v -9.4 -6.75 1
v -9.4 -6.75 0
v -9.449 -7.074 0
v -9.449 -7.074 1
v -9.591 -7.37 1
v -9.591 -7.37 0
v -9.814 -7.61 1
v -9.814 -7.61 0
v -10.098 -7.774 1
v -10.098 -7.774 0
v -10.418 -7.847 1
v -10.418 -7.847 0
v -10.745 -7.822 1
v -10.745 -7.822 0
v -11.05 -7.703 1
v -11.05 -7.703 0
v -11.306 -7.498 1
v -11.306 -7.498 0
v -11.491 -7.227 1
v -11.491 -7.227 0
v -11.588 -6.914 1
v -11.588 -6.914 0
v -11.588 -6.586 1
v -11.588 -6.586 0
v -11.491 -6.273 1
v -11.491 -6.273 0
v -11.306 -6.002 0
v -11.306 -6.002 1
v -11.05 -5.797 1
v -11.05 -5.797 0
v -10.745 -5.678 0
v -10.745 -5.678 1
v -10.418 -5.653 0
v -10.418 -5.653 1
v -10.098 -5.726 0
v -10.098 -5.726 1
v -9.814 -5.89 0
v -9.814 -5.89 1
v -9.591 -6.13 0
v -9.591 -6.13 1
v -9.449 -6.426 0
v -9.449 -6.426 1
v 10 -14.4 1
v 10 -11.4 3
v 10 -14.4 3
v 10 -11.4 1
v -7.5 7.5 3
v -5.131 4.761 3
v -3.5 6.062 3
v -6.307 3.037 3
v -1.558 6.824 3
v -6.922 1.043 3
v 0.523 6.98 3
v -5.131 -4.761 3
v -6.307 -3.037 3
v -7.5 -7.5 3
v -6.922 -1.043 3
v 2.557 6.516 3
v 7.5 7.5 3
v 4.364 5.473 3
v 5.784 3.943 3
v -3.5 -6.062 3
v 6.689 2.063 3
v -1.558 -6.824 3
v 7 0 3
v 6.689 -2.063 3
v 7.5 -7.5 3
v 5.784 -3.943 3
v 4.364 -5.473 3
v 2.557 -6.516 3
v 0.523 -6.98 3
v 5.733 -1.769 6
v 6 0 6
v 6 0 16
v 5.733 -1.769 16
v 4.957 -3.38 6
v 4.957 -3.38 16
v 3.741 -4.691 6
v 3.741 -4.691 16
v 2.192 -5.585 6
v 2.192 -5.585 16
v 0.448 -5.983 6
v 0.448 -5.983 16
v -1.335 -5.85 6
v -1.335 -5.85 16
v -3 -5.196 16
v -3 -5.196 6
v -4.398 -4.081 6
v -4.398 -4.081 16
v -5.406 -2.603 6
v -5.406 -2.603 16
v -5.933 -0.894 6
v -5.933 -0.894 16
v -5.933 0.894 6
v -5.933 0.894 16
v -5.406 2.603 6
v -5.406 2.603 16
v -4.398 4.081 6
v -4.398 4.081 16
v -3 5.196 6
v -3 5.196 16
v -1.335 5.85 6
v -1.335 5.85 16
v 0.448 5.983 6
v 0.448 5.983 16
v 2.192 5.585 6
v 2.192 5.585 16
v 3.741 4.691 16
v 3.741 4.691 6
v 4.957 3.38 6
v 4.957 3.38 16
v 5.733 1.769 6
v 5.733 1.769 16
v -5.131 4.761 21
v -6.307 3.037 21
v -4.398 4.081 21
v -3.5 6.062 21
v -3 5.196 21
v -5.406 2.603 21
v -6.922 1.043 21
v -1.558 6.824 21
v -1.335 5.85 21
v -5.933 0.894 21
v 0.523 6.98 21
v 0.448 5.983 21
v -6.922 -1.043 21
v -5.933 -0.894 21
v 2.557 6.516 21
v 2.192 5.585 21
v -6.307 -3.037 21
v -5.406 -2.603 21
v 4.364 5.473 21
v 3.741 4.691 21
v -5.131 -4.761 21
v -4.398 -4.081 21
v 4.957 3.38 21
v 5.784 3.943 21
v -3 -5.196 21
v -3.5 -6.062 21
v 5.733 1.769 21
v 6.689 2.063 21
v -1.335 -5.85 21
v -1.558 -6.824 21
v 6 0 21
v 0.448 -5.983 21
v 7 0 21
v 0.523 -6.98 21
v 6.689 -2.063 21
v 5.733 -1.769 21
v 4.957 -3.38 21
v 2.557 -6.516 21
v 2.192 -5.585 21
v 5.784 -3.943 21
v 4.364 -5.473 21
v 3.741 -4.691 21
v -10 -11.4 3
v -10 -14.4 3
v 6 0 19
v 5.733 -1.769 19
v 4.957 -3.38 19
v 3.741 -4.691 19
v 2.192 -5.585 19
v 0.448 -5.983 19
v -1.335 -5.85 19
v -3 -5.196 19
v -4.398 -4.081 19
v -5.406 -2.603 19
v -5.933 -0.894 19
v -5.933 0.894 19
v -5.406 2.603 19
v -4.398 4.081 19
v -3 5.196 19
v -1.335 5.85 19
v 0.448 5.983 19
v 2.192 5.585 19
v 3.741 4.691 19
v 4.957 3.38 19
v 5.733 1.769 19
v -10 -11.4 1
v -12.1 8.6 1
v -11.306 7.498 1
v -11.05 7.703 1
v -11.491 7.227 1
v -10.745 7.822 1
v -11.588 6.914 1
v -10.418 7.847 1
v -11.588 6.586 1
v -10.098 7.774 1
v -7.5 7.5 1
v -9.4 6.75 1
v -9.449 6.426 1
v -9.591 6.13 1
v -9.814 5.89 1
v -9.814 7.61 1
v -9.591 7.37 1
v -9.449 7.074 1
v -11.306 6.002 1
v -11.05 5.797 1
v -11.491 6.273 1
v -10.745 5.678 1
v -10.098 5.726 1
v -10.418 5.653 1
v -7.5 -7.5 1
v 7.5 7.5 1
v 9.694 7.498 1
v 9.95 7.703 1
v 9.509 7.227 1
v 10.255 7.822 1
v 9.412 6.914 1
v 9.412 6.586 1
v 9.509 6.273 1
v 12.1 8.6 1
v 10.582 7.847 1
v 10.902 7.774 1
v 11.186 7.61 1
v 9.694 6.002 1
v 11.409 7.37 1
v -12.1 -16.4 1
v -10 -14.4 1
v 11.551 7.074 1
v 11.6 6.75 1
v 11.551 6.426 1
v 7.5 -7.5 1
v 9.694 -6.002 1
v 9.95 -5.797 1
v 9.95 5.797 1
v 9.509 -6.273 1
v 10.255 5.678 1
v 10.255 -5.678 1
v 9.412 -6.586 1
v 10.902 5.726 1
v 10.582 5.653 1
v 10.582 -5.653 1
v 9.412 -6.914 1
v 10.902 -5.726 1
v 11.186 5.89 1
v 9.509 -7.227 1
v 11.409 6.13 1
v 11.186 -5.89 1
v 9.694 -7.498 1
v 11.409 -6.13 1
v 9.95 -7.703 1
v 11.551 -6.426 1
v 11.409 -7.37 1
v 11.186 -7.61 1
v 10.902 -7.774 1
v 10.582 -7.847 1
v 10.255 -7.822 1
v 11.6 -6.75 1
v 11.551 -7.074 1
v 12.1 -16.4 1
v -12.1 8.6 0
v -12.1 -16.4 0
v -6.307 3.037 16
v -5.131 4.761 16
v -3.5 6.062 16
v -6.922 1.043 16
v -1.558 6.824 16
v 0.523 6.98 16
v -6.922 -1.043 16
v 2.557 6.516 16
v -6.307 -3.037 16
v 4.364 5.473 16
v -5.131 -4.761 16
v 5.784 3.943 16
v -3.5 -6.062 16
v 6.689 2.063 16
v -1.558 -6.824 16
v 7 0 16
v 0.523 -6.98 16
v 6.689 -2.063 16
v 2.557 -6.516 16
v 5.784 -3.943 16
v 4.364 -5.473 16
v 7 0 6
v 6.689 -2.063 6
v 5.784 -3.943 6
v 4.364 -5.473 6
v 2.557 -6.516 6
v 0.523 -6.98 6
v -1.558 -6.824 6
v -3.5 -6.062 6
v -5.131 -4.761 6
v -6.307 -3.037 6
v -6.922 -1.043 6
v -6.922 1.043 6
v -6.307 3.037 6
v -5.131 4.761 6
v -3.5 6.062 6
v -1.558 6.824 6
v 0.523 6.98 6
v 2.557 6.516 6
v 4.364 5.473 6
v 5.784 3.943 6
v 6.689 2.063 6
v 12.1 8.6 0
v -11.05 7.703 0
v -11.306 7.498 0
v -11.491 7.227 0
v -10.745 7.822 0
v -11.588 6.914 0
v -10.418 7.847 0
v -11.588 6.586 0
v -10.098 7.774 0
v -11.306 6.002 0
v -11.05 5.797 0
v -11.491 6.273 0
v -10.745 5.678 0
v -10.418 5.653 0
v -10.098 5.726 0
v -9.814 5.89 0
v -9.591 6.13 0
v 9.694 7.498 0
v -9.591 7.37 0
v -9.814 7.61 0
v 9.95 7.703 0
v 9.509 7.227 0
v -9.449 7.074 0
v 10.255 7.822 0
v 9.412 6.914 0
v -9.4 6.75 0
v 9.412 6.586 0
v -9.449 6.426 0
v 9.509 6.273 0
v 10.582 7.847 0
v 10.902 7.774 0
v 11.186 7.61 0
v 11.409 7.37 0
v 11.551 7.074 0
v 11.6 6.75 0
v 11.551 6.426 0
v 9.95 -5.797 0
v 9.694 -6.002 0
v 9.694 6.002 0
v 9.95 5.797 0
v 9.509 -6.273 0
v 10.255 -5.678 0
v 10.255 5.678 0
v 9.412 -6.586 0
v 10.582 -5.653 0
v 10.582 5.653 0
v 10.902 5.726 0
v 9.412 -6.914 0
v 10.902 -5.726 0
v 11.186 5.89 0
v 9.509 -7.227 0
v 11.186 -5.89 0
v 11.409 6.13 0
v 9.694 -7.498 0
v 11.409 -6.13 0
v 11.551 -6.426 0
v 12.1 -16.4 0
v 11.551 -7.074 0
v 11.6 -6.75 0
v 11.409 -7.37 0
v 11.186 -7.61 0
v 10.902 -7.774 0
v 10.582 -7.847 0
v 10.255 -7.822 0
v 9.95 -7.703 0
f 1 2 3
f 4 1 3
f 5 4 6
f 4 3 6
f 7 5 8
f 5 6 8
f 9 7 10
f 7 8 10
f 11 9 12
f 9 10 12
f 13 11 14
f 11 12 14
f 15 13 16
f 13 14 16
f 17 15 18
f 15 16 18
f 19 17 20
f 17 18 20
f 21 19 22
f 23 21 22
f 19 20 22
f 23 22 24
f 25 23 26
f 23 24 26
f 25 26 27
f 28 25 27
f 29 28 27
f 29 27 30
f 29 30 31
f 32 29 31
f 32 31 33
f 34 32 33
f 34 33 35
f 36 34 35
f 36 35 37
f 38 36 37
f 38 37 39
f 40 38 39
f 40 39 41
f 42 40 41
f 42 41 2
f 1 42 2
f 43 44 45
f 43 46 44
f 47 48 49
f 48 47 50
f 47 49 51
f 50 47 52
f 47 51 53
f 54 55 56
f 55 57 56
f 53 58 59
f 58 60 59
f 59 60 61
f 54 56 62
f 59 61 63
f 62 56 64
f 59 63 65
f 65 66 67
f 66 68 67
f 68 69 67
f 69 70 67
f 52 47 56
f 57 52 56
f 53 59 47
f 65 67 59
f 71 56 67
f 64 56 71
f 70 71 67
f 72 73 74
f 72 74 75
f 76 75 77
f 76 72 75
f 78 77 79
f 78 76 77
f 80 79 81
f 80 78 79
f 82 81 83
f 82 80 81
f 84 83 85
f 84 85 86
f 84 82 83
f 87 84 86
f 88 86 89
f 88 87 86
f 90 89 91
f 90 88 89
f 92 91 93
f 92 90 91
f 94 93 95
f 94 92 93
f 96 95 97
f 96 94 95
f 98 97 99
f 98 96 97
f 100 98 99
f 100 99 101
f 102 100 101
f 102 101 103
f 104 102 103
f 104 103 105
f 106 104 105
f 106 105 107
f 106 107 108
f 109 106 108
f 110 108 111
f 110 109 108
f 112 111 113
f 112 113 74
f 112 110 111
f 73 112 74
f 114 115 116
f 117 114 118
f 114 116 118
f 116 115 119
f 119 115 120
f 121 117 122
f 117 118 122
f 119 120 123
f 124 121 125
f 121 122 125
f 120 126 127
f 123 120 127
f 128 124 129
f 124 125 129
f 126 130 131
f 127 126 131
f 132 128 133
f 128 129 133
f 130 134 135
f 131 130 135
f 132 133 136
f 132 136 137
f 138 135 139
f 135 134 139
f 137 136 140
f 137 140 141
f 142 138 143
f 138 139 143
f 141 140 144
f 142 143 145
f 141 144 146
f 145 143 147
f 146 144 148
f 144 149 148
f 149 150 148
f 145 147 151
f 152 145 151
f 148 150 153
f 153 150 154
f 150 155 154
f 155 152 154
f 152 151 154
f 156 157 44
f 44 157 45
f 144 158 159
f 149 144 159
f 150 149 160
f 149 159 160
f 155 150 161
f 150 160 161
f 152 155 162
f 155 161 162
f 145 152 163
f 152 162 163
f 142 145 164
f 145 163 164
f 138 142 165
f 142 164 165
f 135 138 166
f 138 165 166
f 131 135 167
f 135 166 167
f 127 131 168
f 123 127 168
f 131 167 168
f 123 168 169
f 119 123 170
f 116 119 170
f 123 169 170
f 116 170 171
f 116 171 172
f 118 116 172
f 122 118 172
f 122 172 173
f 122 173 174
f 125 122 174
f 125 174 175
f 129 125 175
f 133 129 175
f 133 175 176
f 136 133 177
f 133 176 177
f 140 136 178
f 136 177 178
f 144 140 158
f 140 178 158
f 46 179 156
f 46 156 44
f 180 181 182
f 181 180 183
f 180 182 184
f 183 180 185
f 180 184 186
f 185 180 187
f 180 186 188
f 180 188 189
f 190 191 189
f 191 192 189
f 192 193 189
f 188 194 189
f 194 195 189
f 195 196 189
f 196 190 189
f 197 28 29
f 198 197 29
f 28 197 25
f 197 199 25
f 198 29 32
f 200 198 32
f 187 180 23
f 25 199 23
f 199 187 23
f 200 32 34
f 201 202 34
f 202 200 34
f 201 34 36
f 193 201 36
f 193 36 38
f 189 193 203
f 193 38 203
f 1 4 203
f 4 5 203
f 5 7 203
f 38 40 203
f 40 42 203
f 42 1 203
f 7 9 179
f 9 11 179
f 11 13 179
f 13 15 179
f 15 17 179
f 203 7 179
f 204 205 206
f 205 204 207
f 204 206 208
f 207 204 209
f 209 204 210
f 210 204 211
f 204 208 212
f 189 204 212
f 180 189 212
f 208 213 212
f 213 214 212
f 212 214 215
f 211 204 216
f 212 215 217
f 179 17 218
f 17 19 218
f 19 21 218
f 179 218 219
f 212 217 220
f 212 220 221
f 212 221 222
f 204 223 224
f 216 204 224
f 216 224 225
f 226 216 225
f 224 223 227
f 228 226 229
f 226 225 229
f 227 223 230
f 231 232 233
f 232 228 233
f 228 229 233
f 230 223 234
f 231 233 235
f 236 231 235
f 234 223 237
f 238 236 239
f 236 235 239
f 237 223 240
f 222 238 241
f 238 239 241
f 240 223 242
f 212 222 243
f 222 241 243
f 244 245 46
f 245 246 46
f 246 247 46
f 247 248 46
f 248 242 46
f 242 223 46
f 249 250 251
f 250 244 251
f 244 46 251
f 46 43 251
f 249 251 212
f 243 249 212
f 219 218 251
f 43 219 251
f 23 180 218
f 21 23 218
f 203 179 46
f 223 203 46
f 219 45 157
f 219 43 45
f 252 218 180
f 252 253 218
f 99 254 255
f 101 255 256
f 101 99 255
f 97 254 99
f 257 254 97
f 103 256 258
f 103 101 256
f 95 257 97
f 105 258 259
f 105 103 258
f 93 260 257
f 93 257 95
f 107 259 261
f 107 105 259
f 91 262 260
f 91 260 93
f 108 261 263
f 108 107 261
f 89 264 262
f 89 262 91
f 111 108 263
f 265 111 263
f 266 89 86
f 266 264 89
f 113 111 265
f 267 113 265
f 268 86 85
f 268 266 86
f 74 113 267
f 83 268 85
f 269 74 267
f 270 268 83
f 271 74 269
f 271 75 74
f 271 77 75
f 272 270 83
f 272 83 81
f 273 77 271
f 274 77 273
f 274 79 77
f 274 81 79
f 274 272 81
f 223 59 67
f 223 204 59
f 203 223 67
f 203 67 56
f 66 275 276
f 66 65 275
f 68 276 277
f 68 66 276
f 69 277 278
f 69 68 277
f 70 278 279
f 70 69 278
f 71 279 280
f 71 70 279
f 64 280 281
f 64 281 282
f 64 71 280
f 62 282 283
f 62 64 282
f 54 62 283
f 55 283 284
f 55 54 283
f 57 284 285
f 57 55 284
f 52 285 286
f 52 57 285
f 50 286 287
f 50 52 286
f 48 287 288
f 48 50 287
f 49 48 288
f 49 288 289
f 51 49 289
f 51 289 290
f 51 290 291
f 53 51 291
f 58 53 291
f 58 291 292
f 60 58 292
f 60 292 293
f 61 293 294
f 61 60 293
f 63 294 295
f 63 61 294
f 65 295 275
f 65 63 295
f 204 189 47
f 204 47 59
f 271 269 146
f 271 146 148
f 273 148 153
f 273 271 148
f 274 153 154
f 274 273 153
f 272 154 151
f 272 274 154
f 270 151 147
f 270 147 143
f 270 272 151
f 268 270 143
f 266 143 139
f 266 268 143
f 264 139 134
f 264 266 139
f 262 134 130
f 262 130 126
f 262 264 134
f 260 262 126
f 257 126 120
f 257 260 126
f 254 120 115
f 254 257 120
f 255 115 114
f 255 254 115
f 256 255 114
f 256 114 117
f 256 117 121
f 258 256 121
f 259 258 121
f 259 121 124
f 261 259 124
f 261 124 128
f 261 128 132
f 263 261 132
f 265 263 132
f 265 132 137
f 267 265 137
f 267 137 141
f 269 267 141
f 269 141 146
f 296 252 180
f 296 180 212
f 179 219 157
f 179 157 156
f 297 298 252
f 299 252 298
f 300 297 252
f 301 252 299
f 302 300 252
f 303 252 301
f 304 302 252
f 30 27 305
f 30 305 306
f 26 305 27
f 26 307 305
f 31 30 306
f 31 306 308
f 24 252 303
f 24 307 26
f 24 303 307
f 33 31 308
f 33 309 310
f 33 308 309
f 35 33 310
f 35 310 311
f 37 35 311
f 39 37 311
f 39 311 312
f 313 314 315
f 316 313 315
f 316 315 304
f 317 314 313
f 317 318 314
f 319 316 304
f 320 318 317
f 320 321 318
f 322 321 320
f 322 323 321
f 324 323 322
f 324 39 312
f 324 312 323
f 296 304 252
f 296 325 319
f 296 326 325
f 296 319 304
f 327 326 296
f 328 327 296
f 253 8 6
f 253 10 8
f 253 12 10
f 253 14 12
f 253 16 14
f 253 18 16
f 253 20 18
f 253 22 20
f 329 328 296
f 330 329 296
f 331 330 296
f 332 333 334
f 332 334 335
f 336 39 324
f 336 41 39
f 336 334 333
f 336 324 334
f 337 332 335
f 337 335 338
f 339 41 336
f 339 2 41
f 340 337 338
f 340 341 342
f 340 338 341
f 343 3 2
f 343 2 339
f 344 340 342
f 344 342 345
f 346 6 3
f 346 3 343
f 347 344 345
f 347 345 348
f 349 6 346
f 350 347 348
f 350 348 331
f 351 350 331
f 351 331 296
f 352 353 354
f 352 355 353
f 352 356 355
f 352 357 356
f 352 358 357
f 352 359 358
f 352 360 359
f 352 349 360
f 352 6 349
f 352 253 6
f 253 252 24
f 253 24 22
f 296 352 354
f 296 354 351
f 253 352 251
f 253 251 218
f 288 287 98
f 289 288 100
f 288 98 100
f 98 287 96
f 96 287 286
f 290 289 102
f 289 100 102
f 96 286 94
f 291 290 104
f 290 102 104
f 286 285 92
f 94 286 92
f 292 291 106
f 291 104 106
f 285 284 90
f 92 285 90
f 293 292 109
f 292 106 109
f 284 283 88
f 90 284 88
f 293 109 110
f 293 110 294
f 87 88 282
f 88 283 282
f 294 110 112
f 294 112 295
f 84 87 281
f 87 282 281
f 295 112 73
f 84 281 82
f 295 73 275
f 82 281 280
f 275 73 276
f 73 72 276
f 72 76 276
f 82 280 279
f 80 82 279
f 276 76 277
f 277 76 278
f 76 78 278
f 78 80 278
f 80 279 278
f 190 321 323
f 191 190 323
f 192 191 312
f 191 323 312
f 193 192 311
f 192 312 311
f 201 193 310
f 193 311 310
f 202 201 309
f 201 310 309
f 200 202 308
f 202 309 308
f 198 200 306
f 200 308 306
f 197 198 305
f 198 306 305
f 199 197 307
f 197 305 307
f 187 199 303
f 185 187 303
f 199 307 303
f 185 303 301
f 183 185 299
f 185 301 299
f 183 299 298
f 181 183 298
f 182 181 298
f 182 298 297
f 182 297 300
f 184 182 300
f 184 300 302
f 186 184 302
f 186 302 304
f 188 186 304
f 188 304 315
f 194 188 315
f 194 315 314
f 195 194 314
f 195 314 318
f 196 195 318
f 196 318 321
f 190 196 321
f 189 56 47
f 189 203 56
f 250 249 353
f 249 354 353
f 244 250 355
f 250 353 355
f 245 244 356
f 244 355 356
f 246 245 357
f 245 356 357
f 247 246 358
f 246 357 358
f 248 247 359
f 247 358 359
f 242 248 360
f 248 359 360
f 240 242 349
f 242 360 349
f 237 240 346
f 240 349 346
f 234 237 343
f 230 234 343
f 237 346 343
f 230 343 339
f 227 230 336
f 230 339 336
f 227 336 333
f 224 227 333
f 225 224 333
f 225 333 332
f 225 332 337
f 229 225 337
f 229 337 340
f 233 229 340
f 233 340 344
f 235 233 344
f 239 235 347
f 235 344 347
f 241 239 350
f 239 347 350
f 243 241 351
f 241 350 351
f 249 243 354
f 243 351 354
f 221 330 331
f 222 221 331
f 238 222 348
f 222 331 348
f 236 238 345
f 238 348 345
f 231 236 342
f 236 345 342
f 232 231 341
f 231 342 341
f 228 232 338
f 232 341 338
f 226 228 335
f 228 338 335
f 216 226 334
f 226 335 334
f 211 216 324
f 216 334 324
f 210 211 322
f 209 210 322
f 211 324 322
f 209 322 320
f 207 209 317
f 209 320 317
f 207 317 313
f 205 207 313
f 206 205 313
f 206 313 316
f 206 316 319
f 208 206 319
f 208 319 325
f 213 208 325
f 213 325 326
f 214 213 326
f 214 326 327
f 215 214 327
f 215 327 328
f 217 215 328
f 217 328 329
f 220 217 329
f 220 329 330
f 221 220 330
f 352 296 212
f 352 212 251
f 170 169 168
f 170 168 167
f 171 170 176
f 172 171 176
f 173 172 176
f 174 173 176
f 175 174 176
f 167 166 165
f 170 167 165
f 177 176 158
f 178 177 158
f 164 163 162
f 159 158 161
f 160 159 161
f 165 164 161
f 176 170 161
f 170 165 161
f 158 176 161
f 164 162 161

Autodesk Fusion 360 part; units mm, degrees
sketch "Sketch1" plane through (0, 0, 0) normal (0, 0, -1) x (1, 0, 0)
  circle A0 centre (10.5, -6.75) radius 1.1
  circle A1 centre (-10.5, -6.75) radius 1.1
  circle A2 centre (10.5, 6.75) radius 1.1
  circle A3 centre (-10.5, 6.75) radius 1.1
  line L0 (12.1, -8.6) -> (12.1, 16.4)
  line L1 (12.1, 16.4) -> (-12.1, 16.4)
  line L2 (-12.1, 16.4) -> (-12.1, -8.6)
  line L3 (-12.1, -8.6) -> (12.1, -8.6)
  line L4 (10, 14.4) -> (-10, 14.4)
  line L5 (-10, 14.4) -> (-10, 11.4)
  line L6 (-10, 11.4) -> (10, 11.4)
  line L7 (10, 11.4) -> (10, 14.4)
  line L8 (10, 14.4) -> (-10, 11.4) construction
  line L9 (-10, 14.4) -> (10, 11.4) construction
  circle A4 centre (0, 0) radius 6
  circle A5 centre (0, 0) radius 7
  line L10 (7.5, 7.5) -> (-7.5, 7.5)
  line L11 (-7.5, 7.5) -> (-7.5, -7.5)
  line L12 (-7.5, -7.5) -> (7.5, -7.5)
  line L13 (7.5, -7.5) -> (7.5, 7.5)
  line L14 (7.5, 7.5) -> (-7.5, -7.5) construction
  line L15 (-7.5, 7.5) -> (7.5, -7.5) construction
  point P0 (0, 12.9)
  dimension "d1" = 20
  dimension "d2" = 3
  dimension "d3" = 15
  dimension "d4" = 15
  dimension "d5" = 12
  dimension "d6" = 14
  dimension "d7" = 2
extrude "Extrude3" add sketch "Sketch1" against normal blind 1 contours L0 L1 L2 L3
extrude "Extrude4" add sketch "Sketch1" against normal blind 3 contours L4 L5 L6 L7
extrude "Extrude5" add sketch "Sketch1" against normal blind 3 contours L10 L11 L12 L13
extrude "Extrude6" add sketch "Sketch1" against normal blind 6 contours A5
extrude "Extrude7" add sketch "Sketch1" against normal blind 19 contours A4
extrude "Extrude8" add sketch "Sketch1" against normal blind 5 from surface at -16 contours A5
